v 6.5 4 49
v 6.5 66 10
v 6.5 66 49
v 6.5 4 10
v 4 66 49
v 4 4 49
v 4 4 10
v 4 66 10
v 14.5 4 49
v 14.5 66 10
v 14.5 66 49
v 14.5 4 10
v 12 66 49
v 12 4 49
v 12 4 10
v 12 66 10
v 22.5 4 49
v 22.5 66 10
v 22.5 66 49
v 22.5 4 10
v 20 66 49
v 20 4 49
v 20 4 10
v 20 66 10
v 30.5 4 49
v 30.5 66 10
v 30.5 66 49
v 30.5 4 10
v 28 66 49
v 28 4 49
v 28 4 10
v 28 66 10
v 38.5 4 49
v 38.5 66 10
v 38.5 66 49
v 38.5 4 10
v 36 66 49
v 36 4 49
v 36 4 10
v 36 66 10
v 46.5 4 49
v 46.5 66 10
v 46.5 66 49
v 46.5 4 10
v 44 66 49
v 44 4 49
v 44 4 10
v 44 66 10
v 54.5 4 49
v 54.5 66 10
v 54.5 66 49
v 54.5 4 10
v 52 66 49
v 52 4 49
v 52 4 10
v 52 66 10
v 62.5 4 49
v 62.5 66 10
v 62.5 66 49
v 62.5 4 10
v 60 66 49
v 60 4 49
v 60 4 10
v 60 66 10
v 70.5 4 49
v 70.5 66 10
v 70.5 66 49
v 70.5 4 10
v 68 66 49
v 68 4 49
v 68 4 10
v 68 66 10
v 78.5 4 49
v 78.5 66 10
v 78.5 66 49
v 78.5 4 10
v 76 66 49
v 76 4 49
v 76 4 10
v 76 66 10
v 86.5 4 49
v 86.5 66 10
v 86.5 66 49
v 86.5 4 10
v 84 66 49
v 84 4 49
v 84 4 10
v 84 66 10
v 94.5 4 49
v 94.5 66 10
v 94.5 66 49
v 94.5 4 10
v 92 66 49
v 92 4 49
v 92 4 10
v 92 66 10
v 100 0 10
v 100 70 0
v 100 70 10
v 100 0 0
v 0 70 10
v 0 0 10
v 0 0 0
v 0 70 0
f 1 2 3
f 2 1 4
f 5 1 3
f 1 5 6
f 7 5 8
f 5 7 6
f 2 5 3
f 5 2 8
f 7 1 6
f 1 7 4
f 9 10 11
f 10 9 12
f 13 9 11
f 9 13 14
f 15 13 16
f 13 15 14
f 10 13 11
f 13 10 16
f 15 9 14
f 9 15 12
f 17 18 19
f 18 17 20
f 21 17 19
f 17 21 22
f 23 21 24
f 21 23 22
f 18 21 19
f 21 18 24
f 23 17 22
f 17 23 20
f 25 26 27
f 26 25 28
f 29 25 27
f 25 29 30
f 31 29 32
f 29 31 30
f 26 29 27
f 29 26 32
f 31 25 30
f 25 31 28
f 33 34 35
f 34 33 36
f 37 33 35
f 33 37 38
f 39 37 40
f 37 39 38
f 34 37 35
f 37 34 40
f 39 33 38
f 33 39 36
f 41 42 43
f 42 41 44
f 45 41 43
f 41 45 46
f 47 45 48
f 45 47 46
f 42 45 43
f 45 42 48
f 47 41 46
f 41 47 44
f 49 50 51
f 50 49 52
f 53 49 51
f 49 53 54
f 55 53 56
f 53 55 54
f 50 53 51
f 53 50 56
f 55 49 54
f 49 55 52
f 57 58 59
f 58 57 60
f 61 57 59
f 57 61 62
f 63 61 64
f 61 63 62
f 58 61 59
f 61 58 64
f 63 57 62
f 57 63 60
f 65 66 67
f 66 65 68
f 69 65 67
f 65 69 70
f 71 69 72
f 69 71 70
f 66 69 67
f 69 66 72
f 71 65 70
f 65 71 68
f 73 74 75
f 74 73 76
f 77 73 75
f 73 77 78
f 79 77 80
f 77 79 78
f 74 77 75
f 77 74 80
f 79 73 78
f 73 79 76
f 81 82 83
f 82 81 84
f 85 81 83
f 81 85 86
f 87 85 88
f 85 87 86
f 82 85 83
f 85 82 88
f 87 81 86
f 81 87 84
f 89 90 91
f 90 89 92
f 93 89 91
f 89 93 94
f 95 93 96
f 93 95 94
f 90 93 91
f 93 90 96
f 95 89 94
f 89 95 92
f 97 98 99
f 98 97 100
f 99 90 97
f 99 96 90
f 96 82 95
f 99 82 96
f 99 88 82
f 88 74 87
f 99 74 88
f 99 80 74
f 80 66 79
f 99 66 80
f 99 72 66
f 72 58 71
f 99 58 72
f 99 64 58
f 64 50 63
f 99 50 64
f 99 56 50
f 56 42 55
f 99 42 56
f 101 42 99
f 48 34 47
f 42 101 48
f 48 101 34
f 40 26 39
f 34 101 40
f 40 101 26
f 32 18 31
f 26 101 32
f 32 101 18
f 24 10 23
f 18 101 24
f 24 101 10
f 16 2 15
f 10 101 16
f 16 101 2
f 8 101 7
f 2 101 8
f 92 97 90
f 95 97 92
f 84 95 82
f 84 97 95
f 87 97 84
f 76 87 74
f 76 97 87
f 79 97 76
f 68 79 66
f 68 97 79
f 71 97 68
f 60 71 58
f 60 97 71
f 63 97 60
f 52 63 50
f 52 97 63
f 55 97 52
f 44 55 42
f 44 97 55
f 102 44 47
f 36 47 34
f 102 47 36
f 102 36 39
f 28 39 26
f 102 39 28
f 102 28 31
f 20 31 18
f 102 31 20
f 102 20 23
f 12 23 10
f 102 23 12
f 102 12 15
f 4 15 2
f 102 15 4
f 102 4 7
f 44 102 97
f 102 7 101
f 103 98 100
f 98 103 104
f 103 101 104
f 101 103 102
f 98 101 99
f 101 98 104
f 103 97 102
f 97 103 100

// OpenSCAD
$fn = 32;

// ----------------------------------------------------------------------
// Heatsink: uniform fin block
// ----------------------------------------------------------------------

// --- parameters (mm) ---
base_l = 100;             // base length, X
base_w = 70;              // base width, Y
base_t = 10;              // base plate thickness
fin_h = 40;               // fin height above the base
fin_t = 2.5;              // fin thickness
edge = 4;                 // margin from the base ends
pitch = 8;                // fin pitch

n_fins = floor((base_l - 2 * edge - fin_t) / pitch) + 1;  // fin count
total_h = base_t + fin_h - 1;  // overall height

union() {
  cube([base_l, base_w, base_t]);
  for (i = [0 : n_fins - 1])
    translate([edge + i * pitch, edge, base_t - 1])
      cube([fin_t, base_w - 2 * edge, fin_h]);
}
